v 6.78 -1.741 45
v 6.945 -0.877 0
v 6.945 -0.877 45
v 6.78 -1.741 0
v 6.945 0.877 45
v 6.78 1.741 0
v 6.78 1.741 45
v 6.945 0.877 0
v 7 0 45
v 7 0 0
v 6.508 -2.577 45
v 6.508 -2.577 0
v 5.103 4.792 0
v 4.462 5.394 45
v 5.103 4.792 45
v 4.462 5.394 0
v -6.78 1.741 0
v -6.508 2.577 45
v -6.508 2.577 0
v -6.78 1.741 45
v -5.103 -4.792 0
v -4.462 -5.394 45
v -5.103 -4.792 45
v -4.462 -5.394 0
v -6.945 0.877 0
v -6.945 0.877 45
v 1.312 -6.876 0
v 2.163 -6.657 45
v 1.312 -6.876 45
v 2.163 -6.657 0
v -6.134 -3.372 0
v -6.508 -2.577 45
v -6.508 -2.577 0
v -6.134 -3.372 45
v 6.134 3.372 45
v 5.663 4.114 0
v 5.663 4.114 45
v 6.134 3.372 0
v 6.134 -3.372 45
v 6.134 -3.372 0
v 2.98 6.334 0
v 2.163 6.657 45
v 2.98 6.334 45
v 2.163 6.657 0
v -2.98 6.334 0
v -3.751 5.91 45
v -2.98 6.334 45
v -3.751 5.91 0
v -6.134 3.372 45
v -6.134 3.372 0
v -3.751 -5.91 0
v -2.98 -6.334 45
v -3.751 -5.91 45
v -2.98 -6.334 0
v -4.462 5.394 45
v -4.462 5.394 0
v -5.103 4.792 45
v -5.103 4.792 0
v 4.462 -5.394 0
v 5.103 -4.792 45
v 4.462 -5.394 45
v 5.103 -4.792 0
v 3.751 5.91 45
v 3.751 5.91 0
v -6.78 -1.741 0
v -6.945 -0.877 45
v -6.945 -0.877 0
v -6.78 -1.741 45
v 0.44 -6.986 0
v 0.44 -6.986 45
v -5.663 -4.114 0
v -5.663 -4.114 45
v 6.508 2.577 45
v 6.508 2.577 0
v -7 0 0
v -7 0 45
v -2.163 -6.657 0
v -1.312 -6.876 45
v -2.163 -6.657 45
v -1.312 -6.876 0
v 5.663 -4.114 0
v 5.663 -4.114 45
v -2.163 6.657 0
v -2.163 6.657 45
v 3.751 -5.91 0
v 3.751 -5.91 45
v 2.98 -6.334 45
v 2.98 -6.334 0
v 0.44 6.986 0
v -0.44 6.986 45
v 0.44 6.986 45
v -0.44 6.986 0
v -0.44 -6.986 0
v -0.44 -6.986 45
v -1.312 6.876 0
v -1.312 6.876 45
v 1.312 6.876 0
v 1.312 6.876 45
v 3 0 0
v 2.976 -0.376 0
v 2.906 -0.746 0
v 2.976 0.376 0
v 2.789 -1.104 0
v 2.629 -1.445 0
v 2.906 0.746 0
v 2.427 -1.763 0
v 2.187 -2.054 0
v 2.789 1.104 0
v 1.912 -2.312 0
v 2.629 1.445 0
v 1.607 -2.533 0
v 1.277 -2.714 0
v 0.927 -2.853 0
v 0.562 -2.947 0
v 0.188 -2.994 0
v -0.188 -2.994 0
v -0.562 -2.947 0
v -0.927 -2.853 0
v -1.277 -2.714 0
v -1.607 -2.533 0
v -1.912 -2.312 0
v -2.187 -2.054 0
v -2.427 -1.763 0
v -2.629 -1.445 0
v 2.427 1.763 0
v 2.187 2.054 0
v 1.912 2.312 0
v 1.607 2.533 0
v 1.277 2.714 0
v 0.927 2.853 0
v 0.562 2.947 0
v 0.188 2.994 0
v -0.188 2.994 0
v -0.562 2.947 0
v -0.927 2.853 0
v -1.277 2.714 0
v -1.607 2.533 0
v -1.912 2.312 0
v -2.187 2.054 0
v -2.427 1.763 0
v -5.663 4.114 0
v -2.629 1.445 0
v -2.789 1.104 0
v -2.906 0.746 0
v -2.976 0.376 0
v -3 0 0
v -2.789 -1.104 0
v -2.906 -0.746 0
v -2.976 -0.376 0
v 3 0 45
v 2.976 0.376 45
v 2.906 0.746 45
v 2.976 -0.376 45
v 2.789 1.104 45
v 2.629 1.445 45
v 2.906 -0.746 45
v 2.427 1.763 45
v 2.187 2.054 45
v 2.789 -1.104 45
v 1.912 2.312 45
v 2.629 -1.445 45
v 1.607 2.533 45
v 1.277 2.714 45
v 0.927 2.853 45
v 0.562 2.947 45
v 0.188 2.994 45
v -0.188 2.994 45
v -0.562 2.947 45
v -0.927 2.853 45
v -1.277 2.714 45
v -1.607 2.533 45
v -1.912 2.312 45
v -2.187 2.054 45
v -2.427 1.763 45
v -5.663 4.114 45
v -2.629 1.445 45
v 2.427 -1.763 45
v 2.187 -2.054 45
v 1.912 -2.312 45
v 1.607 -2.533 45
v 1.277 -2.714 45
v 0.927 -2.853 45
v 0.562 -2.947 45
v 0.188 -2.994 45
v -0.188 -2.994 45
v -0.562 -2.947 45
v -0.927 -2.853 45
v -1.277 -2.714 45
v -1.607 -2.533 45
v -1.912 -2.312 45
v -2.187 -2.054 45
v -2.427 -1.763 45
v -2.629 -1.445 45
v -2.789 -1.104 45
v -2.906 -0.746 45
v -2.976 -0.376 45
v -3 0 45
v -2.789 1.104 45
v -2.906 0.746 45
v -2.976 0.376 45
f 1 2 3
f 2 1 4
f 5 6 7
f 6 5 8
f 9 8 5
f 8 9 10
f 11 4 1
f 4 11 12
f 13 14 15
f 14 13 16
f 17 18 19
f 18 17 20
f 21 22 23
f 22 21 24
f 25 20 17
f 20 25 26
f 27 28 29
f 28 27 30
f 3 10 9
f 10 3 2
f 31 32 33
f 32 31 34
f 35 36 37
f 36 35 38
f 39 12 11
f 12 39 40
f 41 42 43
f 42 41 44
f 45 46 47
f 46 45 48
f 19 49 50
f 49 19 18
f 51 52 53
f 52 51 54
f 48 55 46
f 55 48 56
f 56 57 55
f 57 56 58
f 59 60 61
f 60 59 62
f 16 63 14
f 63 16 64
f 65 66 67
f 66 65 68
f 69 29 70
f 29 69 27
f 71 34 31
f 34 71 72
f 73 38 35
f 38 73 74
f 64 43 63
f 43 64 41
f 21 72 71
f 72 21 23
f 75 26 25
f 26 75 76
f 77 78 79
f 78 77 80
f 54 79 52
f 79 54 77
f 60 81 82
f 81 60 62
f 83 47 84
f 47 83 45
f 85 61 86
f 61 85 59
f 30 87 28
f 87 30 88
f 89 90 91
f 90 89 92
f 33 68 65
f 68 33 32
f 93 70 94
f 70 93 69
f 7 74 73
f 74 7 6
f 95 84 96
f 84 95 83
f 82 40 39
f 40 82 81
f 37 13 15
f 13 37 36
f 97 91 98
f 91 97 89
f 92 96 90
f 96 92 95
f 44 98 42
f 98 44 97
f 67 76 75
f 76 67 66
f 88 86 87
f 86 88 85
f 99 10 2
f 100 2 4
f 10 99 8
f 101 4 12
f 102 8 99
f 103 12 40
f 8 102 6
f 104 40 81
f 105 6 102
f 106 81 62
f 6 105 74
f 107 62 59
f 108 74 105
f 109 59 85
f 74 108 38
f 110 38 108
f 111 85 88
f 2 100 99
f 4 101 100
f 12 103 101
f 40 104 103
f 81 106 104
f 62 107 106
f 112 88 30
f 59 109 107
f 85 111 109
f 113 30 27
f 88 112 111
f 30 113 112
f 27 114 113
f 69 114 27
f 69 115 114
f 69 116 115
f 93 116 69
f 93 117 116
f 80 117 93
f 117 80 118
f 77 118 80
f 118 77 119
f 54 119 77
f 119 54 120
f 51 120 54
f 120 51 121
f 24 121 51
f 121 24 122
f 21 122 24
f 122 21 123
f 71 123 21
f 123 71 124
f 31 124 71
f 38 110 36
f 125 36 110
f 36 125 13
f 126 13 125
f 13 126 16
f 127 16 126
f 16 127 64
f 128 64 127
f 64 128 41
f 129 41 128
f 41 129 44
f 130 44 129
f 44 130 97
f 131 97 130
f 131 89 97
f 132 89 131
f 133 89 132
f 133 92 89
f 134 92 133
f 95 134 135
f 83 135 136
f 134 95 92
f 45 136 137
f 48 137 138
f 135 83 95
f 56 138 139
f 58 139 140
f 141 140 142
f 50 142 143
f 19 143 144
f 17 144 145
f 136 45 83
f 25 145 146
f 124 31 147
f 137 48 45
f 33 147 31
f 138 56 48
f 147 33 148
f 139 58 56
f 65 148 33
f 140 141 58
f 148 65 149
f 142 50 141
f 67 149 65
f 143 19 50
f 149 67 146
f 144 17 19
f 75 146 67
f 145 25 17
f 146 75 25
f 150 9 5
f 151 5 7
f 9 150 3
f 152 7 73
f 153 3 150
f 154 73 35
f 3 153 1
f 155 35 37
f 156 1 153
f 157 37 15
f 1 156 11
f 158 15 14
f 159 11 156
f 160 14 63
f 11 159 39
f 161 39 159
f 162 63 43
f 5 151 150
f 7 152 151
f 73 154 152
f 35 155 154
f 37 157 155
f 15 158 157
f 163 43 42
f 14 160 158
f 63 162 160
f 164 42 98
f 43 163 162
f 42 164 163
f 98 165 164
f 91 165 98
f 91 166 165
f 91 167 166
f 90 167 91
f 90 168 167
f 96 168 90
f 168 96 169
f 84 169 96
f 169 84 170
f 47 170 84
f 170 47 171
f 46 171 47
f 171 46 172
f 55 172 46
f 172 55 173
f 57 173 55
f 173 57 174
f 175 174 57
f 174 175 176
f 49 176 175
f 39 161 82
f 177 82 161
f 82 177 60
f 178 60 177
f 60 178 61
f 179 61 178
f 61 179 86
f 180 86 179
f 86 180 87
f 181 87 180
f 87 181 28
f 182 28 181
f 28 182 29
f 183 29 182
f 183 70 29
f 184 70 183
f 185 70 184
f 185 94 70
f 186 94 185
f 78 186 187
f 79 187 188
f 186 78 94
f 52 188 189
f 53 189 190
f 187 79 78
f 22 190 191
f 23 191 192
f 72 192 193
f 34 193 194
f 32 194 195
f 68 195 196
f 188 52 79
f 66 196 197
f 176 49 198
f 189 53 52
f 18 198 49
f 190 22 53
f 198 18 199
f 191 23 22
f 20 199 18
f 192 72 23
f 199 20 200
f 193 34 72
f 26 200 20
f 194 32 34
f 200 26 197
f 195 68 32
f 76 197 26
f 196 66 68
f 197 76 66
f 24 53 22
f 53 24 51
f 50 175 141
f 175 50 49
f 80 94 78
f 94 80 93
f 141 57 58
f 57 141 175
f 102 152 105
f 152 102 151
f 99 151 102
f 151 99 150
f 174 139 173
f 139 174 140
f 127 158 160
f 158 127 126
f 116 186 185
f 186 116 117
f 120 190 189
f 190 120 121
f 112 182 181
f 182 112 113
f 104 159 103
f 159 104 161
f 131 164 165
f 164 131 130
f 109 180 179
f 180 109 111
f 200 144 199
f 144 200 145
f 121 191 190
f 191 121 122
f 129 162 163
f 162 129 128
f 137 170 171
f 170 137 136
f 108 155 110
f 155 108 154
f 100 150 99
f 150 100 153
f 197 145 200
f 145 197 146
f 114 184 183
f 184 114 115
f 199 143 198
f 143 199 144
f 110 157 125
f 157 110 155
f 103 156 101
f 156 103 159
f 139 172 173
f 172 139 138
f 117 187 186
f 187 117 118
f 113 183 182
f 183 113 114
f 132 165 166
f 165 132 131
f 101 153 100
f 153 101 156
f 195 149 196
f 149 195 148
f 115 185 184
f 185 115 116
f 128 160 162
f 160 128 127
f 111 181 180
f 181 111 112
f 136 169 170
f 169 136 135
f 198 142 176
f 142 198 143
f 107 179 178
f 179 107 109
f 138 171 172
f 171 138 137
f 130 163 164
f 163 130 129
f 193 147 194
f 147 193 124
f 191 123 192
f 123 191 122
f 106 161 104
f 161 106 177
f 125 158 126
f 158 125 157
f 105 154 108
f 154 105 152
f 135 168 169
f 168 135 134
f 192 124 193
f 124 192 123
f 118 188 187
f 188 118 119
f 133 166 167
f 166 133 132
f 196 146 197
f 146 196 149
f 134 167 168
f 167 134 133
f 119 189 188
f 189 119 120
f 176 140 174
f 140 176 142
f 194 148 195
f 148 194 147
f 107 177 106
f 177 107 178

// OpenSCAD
$fn = 50;


difference() {
	union() {
		cylinder(h = 45, r = 7.0000000000);
	}
	union() {
		translate(v = [0, 0, -100]) {
			cylinder(h = 200, r = 3.0000000000);
		}
	}
}
